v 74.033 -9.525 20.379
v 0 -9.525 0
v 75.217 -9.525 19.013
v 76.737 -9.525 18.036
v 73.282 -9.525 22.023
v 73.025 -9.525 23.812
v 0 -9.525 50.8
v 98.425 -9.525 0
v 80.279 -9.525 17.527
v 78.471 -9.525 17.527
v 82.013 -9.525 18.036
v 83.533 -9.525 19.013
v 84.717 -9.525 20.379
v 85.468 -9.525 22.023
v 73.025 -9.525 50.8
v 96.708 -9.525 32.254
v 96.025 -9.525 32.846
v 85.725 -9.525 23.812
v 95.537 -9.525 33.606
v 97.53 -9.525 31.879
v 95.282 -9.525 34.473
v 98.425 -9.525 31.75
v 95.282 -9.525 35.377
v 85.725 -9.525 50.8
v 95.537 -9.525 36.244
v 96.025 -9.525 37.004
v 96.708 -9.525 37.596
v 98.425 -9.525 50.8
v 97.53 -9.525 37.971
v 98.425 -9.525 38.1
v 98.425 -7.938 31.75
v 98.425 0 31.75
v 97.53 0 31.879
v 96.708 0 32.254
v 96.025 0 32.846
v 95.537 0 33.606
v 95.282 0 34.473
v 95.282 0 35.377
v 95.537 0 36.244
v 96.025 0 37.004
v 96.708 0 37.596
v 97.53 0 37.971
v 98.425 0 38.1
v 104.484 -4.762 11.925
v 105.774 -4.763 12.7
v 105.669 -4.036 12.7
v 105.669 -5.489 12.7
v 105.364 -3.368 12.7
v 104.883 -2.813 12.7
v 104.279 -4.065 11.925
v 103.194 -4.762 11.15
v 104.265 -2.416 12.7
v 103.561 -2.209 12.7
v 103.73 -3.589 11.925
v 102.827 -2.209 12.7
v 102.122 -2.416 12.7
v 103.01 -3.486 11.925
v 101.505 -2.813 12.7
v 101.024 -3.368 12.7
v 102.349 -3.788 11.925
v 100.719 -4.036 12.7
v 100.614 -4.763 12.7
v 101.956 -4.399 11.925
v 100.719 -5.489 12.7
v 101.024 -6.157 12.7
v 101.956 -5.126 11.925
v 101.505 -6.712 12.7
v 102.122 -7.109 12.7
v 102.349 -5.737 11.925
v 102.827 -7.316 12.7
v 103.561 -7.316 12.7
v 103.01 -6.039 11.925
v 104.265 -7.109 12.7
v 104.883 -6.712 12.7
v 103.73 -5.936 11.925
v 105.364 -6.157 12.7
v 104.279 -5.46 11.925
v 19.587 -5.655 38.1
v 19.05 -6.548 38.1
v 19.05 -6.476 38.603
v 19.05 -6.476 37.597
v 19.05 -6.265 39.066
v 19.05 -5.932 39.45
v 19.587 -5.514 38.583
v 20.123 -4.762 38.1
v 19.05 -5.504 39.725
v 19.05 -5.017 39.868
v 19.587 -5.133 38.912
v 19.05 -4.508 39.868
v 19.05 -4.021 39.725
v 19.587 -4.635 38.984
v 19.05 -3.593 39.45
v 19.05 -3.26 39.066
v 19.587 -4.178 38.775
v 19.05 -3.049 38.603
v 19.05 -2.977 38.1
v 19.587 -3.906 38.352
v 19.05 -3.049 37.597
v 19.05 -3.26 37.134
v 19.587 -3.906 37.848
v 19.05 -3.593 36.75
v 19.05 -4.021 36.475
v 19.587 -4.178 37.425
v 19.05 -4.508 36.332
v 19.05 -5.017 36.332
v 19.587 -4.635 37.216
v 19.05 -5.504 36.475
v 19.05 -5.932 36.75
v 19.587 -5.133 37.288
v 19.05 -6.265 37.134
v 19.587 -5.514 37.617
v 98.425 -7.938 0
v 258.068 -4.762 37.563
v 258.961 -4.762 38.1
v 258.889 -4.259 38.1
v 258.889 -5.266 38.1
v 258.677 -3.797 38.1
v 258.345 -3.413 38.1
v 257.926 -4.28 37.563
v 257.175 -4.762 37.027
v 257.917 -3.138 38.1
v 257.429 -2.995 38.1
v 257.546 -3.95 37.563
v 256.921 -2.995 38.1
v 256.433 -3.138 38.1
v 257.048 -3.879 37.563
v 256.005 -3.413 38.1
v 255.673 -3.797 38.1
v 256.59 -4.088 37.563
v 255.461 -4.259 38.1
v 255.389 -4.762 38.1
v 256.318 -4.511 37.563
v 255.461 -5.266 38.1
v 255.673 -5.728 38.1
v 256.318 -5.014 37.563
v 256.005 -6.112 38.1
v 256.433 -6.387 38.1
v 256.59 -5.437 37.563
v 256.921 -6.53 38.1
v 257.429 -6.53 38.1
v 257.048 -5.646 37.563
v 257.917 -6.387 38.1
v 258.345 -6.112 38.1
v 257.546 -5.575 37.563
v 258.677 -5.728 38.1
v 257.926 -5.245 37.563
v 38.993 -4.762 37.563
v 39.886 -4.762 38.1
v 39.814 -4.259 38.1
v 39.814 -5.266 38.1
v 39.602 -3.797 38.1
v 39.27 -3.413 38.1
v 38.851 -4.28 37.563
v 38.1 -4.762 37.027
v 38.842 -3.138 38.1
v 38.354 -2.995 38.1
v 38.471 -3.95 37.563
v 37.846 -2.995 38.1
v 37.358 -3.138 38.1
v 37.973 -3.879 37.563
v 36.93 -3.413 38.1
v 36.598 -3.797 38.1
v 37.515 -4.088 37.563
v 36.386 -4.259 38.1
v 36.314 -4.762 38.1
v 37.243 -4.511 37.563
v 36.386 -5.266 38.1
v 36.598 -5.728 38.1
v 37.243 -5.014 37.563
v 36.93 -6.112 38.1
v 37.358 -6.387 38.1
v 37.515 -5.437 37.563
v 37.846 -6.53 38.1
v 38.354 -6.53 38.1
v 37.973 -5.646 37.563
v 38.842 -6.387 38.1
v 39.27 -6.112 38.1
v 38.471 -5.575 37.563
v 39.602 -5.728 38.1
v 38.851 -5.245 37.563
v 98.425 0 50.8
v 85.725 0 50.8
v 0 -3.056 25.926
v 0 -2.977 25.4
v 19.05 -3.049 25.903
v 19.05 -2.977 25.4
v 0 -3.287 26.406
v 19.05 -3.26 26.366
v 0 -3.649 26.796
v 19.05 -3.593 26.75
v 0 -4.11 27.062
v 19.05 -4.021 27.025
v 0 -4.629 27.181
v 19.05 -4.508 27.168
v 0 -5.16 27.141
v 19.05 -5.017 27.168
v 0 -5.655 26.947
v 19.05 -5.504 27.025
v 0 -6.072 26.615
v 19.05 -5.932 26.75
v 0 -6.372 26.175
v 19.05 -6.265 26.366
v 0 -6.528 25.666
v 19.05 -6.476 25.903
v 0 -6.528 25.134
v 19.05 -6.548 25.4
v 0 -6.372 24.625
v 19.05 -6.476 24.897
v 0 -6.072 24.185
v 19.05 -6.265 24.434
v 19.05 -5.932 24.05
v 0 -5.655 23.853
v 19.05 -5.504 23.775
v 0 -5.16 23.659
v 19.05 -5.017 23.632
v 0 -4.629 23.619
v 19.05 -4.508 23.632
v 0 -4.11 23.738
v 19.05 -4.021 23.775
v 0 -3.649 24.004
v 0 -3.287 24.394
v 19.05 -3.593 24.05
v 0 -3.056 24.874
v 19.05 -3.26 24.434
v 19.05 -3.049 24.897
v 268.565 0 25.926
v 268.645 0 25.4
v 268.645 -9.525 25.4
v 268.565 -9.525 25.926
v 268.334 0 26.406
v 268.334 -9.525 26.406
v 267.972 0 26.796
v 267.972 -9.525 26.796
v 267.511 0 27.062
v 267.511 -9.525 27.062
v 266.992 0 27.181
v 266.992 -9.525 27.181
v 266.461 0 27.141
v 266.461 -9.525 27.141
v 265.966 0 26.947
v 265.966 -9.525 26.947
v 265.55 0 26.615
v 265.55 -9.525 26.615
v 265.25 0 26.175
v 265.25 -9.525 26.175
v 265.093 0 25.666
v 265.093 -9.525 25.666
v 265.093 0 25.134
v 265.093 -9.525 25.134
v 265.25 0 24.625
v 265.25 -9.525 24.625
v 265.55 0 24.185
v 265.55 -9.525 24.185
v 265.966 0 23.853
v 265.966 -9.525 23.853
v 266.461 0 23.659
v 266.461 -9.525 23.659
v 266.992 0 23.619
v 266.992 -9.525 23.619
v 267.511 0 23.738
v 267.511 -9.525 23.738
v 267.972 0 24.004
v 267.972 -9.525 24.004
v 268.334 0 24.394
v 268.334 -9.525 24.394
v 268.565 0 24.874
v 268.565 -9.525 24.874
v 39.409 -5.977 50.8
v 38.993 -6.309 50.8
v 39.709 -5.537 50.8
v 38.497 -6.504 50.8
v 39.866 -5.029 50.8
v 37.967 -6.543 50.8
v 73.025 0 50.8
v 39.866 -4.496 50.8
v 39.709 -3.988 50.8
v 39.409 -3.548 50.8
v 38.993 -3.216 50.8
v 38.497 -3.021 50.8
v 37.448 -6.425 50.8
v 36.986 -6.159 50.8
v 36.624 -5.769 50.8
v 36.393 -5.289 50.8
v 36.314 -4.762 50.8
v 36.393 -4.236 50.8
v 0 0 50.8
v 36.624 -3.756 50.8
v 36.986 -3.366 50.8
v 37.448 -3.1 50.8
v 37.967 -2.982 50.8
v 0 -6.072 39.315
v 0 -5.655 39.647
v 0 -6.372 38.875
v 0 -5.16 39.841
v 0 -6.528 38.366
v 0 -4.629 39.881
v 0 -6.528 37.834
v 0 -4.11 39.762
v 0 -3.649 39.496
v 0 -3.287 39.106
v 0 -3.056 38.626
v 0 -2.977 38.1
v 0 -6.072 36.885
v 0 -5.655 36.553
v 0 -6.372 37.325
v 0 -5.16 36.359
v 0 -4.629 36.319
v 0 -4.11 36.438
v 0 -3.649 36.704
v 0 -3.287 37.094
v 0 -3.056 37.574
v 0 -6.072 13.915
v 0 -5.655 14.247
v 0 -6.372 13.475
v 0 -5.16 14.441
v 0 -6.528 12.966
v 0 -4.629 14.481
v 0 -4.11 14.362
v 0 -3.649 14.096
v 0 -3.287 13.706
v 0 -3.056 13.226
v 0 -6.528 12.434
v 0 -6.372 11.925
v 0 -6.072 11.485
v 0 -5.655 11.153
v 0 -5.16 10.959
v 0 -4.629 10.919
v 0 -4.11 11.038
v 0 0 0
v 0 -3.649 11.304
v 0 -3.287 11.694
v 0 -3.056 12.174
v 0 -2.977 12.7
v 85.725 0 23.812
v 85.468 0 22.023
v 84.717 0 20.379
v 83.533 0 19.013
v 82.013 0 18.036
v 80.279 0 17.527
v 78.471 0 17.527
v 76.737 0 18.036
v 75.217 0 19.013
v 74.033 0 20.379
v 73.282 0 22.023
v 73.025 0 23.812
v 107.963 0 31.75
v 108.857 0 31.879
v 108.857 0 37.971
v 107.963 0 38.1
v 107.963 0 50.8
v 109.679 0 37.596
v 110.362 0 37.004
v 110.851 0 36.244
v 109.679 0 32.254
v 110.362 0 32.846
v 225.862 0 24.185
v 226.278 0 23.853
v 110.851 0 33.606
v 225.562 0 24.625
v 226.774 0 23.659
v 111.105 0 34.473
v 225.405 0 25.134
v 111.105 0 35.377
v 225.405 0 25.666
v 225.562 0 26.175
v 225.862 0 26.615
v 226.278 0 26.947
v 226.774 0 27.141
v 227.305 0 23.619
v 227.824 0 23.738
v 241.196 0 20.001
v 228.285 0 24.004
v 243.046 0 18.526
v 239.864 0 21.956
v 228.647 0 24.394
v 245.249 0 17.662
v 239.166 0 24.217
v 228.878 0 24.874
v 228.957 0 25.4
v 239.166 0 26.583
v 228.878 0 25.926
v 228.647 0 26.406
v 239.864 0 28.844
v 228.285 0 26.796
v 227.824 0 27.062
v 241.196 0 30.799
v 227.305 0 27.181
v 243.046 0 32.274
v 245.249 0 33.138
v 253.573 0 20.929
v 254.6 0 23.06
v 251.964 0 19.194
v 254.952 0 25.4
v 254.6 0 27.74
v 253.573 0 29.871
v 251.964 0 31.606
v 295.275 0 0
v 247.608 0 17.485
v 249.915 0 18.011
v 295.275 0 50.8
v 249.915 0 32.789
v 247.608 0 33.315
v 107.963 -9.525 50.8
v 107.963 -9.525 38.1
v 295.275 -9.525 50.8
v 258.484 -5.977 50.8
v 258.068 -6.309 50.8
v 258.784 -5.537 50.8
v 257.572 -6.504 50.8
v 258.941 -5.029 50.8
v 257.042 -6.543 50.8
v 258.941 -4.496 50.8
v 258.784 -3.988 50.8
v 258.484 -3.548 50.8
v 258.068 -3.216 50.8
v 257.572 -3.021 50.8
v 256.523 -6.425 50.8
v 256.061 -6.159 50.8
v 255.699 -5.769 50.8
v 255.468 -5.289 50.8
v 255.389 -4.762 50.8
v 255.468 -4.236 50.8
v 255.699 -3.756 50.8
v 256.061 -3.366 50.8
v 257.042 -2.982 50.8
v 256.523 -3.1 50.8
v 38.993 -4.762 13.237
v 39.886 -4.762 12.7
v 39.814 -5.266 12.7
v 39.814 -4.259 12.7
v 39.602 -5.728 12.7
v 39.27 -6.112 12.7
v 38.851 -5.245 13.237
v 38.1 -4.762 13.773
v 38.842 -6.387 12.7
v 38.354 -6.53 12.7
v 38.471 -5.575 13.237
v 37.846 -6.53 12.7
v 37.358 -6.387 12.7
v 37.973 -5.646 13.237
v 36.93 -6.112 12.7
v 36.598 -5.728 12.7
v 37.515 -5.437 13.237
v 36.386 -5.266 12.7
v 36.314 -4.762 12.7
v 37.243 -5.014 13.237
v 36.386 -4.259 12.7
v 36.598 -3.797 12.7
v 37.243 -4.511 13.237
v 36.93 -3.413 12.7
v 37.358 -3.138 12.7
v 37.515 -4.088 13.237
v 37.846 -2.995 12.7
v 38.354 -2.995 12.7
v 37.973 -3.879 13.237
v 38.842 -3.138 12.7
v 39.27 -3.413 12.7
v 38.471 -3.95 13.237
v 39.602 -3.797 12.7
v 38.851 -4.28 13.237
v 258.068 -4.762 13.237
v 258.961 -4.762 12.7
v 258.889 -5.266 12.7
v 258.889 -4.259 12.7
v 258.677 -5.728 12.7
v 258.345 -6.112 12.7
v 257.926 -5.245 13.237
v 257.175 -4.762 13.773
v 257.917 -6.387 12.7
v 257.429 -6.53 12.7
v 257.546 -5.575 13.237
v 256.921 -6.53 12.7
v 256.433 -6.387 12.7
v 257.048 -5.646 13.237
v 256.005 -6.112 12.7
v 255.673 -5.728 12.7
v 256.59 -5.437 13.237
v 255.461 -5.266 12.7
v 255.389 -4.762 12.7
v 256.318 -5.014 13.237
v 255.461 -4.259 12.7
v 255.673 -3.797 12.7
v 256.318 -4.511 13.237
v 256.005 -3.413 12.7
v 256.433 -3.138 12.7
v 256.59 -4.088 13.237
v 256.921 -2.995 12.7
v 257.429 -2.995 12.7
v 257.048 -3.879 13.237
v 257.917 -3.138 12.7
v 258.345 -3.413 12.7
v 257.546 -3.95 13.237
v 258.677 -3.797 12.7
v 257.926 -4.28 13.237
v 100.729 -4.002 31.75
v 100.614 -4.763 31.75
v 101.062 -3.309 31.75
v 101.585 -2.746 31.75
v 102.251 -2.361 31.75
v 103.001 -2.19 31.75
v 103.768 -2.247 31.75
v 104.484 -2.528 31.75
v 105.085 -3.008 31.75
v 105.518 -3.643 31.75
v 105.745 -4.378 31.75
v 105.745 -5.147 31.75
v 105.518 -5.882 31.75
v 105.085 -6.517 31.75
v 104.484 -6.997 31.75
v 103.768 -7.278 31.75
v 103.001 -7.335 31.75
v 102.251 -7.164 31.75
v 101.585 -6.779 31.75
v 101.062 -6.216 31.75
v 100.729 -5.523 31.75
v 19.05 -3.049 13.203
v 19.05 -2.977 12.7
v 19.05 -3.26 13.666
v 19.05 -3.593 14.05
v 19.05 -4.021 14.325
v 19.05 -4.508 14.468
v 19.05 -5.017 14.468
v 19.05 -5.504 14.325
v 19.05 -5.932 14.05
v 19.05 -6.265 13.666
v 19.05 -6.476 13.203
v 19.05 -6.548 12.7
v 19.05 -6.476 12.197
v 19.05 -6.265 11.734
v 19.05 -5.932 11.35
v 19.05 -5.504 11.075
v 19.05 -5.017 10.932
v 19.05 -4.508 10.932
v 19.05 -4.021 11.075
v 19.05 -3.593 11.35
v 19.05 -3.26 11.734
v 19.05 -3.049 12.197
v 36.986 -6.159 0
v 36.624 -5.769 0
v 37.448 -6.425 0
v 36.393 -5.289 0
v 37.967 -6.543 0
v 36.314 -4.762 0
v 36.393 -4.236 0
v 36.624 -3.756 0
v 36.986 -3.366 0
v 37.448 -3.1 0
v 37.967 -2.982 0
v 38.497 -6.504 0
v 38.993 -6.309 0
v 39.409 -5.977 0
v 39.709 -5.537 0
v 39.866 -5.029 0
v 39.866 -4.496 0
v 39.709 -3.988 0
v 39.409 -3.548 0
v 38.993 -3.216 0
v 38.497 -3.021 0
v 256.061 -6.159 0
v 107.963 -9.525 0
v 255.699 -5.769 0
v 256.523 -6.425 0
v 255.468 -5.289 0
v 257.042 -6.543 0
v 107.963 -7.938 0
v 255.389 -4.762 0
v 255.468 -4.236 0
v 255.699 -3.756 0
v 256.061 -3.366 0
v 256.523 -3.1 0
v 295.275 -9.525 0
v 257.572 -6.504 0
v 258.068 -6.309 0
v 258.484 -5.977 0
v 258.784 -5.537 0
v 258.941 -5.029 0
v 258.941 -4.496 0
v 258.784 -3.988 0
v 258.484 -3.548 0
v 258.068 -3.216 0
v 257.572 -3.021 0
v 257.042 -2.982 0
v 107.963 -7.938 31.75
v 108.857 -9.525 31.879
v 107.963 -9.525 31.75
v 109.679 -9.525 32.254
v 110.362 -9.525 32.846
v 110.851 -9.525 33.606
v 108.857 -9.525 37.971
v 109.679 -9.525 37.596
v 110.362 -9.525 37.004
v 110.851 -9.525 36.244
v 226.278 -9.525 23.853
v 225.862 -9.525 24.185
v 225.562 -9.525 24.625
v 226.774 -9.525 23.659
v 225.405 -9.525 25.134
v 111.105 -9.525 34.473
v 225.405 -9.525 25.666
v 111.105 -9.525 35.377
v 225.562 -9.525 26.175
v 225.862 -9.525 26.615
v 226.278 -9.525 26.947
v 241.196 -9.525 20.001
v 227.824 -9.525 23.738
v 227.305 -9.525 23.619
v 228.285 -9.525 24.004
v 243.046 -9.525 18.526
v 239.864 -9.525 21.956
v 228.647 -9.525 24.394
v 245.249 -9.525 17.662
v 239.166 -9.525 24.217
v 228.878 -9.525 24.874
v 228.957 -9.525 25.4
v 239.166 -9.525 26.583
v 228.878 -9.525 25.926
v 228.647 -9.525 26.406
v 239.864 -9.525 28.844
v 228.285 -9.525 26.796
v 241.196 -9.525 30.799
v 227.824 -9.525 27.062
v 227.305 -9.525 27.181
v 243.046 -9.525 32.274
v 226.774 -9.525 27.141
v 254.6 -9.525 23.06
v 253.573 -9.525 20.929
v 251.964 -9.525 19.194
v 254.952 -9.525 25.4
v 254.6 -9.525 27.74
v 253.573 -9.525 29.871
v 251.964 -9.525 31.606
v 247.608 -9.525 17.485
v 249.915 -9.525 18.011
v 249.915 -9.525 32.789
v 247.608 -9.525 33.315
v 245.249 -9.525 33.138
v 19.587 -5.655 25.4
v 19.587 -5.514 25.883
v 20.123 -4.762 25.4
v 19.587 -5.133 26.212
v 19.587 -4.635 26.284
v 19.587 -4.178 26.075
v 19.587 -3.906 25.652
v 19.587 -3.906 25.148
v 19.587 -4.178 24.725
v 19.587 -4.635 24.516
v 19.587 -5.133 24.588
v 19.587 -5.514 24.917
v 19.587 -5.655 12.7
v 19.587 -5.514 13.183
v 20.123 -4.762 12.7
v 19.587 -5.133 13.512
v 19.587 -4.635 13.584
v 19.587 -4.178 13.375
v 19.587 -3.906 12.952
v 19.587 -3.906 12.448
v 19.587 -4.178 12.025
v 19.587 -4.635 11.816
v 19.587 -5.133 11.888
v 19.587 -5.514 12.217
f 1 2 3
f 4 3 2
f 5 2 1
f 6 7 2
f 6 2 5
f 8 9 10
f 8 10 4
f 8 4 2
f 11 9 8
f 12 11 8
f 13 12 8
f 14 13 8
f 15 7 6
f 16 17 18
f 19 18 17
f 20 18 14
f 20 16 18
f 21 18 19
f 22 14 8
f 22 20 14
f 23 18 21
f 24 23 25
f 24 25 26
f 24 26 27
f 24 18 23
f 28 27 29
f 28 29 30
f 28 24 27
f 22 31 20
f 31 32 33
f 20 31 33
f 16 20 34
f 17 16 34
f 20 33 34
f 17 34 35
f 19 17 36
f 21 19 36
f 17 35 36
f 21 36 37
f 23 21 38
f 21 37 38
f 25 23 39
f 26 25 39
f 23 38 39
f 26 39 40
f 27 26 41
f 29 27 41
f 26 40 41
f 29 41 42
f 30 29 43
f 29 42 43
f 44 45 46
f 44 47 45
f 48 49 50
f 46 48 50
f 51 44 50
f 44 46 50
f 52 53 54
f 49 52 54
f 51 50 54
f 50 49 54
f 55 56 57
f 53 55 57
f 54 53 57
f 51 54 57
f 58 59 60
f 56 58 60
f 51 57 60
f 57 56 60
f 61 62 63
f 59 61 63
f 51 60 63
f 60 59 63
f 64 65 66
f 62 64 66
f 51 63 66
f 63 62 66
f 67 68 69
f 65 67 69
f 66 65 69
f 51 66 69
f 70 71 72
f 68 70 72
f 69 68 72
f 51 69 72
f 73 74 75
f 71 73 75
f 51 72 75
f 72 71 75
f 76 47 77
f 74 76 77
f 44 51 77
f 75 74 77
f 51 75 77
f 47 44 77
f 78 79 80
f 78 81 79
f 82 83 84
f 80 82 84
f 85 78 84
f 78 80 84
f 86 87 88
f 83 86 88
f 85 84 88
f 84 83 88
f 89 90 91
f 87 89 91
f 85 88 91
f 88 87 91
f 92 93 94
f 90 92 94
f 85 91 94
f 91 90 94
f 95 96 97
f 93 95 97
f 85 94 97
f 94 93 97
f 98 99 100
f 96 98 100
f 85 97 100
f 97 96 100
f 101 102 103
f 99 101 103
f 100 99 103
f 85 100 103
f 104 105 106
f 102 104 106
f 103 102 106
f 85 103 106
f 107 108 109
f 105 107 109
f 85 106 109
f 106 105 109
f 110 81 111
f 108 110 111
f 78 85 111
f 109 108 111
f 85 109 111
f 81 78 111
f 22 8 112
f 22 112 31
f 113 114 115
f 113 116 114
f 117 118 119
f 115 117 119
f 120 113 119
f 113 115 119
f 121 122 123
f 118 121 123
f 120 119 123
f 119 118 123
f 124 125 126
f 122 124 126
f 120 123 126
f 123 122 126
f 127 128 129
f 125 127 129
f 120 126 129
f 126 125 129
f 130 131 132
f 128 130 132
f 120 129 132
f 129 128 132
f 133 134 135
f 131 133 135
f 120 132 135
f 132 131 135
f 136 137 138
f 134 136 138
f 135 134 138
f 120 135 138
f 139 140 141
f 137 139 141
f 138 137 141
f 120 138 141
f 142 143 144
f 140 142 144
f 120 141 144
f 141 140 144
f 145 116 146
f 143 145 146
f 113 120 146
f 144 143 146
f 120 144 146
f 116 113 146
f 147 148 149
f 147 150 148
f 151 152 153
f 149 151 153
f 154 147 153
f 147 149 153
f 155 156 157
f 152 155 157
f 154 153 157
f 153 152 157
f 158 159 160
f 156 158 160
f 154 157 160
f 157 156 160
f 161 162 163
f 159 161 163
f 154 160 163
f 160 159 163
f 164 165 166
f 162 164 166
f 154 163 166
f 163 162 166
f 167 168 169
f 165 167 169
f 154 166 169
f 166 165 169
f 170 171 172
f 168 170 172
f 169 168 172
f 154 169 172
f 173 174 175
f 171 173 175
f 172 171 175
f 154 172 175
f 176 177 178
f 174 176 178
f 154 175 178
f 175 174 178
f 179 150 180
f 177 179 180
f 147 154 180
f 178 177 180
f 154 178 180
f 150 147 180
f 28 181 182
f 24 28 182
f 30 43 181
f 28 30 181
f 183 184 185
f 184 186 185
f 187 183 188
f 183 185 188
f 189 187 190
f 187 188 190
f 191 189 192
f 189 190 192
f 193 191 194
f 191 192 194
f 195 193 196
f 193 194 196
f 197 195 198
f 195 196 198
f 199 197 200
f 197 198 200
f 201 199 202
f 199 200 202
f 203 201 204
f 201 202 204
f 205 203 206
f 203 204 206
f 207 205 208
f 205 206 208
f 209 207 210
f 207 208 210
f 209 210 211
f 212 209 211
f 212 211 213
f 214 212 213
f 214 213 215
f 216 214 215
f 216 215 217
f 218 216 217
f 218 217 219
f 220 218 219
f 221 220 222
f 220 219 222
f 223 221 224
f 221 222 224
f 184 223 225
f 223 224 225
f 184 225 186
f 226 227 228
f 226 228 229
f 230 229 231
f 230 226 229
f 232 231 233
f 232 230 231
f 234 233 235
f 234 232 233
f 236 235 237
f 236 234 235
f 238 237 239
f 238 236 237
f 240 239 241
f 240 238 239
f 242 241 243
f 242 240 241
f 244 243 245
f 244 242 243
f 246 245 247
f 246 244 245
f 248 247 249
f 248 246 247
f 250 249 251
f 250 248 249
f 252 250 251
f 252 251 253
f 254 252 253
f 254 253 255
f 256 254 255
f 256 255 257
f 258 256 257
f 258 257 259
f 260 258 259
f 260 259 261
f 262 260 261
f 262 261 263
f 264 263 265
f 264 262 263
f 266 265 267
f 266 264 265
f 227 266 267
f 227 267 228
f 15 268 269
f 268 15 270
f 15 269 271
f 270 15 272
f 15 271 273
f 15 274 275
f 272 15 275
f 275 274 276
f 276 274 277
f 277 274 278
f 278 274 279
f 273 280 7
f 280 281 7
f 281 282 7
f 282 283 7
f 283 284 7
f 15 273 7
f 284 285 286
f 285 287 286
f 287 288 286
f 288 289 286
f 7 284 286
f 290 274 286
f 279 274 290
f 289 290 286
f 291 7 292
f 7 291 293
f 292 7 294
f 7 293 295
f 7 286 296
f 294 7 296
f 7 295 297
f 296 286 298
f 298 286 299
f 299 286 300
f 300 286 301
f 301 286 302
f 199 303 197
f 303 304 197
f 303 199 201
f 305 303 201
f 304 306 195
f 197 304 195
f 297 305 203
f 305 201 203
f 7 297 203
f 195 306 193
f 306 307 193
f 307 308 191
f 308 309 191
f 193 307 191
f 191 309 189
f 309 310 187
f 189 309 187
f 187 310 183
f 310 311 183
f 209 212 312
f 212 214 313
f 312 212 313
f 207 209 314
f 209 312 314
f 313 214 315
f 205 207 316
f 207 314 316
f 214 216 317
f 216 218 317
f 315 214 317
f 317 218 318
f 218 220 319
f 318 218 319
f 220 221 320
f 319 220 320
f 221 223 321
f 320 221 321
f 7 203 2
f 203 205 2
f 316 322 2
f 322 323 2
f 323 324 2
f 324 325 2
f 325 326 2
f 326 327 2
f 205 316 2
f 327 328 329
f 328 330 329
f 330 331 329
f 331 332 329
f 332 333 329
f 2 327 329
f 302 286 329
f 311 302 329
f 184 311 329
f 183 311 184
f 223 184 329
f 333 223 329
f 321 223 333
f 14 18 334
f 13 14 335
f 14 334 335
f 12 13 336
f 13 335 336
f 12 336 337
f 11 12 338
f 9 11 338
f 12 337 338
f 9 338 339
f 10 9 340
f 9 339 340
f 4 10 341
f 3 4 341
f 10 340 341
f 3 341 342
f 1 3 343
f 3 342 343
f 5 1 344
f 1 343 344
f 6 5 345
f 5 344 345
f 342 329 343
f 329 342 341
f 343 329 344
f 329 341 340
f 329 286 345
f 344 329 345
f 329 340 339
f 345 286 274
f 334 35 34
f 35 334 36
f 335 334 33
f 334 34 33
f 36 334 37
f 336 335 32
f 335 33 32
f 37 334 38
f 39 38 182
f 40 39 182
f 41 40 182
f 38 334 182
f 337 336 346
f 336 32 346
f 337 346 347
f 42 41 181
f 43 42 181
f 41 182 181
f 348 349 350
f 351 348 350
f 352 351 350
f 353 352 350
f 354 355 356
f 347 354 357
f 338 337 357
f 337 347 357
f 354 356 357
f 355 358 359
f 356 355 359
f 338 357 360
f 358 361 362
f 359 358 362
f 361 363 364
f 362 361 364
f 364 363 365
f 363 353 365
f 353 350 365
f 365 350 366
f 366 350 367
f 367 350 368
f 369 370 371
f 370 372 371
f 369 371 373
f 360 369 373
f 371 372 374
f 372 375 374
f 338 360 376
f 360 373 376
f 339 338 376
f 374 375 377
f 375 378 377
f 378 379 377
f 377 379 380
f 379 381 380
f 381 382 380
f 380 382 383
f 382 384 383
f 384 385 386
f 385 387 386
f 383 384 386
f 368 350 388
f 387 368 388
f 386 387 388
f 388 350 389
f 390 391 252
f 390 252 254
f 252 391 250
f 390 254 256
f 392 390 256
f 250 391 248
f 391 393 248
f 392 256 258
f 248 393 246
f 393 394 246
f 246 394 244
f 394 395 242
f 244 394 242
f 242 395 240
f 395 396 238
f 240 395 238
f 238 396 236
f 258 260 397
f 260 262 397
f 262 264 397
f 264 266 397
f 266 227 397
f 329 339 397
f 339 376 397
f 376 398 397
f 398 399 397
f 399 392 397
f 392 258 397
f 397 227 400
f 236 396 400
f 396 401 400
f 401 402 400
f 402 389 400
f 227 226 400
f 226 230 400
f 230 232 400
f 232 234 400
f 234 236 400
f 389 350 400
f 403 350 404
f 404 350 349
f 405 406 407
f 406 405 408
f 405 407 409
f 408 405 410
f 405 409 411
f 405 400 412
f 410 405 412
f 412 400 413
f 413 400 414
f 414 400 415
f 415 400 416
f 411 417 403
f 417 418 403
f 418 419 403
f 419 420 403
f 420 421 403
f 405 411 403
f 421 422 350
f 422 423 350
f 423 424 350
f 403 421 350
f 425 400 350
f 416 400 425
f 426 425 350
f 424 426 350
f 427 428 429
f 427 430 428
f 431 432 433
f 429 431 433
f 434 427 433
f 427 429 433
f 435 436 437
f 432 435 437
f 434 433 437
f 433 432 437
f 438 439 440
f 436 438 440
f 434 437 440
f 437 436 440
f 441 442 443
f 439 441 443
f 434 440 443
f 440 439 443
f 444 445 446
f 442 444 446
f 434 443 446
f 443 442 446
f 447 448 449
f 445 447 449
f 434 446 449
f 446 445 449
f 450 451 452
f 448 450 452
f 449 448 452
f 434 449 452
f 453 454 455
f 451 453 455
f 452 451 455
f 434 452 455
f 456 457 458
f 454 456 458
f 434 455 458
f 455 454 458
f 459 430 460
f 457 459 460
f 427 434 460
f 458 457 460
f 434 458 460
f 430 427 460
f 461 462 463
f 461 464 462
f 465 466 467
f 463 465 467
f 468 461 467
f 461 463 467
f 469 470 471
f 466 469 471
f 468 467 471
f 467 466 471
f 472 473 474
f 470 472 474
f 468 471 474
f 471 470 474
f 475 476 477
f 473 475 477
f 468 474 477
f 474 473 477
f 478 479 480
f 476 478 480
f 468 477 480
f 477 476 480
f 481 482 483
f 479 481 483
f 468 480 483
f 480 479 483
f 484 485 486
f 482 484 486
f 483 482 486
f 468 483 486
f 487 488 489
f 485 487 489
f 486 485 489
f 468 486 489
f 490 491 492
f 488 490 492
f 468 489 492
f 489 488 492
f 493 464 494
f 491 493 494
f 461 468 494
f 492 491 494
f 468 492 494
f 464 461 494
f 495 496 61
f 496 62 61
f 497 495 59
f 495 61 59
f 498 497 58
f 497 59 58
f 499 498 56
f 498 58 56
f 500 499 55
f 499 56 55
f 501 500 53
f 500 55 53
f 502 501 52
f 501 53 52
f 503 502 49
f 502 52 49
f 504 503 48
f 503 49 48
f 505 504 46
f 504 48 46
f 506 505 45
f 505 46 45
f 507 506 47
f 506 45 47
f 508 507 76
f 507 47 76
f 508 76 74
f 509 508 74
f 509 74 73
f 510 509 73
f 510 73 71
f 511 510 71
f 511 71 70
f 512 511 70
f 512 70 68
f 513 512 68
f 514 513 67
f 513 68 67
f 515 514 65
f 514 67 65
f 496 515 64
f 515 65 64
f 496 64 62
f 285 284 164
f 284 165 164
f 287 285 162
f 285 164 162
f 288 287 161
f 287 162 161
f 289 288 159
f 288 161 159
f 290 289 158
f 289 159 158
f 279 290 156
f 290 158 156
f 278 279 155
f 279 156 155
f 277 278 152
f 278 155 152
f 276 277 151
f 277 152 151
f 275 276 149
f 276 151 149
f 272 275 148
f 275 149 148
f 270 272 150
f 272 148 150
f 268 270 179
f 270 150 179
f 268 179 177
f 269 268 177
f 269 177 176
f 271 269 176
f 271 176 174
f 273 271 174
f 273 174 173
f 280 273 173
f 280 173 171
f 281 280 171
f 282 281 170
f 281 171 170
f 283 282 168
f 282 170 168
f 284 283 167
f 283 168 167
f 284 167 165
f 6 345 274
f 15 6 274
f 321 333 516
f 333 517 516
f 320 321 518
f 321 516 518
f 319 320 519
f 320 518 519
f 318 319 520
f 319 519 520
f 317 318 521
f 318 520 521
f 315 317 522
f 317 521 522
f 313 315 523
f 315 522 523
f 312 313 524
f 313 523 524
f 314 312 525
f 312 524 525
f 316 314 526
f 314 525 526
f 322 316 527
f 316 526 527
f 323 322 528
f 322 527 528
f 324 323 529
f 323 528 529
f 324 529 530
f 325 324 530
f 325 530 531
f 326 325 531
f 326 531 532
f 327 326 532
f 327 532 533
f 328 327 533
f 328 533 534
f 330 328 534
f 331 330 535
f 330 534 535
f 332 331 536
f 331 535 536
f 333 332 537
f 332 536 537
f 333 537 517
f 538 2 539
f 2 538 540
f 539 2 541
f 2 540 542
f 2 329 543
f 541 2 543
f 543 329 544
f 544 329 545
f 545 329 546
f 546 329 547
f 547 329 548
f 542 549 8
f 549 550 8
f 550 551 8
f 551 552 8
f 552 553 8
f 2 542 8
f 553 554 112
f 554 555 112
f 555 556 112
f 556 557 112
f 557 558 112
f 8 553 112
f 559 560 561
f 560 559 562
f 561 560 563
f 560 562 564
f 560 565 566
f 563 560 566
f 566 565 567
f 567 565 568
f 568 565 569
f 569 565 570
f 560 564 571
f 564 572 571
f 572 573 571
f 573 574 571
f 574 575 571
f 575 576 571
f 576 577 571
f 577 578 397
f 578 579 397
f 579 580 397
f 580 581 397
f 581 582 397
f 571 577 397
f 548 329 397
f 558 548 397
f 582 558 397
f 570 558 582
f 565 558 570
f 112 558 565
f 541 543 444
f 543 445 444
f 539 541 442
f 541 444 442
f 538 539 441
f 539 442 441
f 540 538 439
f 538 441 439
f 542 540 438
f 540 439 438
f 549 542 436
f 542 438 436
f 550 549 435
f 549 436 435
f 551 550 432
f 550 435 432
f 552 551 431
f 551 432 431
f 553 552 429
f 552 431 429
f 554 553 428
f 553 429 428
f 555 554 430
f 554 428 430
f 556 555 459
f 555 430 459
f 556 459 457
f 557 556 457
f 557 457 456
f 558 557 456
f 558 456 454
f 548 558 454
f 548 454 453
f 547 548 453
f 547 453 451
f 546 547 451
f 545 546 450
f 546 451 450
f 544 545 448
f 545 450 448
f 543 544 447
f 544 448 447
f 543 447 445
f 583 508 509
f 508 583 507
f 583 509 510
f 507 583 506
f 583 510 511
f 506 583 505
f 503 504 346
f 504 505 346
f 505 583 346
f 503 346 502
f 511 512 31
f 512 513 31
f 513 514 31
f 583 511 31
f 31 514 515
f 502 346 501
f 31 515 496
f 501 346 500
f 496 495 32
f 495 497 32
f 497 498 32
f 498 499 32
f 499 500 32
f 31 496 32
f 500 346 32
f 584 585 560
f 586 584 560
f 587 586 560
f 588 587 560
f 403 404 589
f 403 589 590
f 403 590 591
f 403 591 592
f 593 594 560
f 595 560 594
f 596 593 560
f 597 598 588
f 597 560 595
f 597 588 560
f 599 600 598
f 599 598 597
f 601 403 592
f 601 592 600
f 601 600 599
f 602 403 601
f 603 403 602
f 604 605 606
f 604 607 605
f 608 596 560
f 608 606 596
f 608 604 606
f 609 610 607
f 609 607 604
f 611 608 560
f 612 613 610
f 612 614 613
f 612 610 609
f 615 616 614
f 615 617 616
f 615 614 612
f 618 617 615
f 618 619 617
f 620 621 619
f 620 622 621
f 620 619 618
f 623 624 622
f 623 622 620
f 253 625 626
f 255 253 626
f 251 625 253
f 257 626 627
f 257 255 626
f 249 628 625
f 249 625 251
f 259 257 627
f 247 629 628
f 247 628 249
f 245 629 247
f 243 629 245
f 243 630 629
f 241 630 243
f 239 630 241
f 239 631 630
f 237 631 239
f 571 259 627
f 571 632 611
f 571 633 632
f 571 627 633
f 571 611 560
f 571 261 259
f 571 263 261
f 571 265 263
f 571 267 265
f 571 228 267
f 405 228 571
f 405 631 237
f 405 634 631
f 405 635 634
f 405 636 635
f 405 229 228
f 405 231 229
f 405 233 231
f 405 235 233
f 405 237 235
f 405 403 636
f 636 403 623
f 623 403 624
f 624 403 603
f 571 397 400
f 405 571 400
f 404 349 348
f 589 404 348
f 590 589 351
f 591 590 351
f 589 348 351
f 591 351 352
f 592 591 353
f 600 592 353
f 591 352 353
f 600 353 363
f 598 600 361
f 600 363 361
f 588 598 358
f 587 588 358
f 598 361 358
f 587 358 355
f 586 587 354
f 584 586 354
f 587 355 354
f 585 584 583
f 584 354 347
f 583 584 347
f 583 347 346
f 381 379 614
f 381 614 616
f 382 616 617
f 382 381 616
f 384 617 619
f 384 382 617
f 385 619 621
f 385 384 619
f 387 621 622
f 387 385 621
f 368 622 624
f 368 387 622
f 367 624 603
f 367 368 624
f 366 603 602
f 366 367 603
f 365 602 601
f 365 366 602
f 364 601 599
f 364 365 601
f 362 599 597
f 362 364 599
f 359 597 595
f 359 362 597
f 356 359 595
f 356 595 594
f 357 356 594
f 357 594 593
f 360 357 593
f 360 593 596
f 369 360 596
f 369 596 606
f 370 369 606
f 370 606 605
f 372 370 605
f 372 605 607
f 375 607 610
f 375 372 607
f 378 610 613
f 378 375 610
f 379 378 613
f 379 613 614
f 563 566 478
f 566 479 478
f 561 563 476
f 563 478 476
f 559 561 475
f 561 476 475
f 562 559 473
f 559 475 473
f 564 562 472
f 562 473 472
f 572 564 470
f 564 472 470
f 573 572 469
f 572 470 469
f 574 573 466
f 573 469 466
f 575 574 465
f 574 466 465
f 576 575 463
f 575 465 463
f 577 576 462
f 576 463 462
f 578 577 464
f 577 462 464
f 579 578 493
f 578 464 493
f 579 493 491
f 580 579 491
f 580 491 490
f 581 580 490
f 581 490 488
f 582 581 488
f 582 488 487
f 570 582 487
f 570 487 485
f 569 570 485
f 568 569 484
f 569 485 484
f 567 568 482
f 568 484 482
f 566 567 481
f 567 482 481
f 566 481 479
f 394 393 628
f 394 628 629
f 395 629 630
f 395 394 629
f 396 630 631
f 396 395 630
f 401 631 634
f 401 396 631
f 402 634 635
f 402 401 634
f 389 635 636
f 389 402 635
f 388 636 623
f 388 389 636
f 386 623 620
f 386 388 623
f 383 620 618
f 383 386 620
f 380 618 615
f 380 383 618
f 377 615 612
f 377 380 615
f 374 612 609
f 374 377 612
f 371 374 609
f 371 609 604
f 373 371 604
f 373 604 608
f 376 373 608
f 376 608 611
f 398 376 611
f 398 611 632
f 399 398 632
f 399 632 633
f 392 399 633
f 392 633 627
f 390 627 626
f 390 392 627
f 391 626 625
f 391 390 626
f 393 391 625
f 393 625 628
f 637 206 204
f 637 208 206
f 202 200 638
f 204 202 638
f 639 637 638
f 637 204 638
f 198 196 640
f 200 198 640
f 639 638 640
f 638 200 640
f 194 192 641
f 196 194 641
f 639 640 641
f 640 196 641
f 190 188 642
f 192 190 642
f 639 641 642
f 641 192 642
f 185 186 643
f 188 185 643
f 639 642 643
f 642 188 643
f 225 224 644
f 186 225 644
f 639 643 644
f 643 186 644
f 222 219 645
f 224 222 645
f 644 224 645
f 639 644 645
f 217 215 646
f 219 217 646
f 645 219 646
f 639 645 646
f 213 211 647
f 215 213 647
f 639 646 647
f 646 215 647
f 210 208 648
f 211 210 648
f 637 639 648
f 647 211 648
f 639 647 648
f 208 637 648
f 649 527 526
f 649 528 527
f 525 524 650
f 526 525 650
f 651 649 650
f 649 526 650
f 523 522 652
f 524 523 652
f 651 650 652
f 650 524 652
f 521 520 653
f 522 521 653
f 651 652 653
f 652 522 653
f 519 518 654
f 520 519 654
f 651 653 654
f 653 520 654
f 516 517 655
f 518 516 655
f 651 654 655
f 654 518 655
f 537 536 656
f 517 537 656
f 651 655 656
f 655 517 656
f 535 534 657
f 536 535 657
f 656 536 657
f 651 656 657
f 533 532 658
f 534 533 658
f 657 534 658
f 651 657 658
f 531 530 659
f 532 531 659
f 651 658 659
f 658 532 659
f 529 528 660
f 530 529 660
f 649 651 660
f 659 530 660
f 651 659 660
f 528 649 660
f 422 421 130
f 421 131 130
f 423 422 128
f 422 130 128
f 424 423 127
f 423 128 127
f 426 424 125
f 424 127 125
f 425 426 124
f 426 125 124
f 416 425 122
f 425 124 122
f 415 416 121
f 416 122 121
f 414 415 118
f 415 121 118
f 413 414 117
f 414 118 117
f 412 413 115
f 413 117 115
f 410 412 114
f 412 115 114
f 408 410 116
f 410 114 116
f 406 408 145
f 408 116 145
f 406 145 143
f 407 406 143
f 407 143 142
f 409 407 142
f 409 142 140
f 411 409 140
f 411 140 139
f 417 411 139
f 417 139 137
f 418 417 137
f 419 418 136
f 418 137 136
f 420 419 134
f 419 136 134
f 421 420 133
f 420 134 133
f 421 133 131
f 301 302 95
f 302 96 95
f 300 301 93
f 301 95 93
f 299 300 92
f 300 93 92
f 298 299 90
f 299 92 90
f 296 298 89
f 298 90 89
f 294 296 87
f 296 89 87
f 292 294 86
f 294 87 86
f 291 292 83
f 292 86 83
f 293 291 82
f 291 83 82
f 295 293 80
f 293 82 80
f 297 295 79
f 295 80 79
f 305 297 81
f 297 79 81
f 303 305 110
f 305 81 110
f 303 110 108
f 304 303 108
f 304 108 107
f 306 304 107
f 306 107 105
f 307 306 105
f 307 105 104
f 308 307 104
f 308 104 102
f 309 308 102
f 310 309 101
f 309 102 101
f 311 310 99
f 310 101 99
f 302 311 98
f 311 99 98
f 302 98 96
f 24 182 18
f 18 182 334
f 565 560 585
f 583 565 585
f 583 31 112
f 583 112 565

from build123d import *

# Parameters (mm, degrees)
F0_R            = 1.7859375
F0_R_2          = 7.9375
F1_DEPTH        = 9.525
F2_W            = 9.5377
F2_H            = 31.75
F3_DEPTH        = 1.5875
F5_D            = 3.571875
F5_DEPTH        = 19.05
F5_TIP          = 1.0730995118
F7_D            = 5.159375
F7_DEPTH        = 19.05
F7_TIP          = 1.5500326281
F11_D           = 3.571875
F11_DEPTH       = 12.7
F11_TIP         = 1.0730995118
F11_ON_F8_D     = 3.571875
F11_ON_F8_DEPTH = 12.7
F11_ON_F8_TIP   = 1.0730995118
F11_ON_F9_D     = 3.571875
F11_ON_F9_DEPTH = 12.7
F11_ON_F9_TIP   = 1.0730995118


with BuildPart() as f1:
    # F0 (on Front) → F1 (new body)
    with BuildSketch(Plane.XZ):
        with BuildLine():
            Line((0, 50.8), (0, 0))
            Line((0, 0), (295.275, 0))
            Line((295.275, 0), (295.275, 50.8))
            Line((295.275, 50.8), (107.9627, 50.8))
            Line((107.9627, 50.8), (107.9627, 38.1))
            ThreePointArc((107.9627, 38.1), (111.1377, 34.925), (107.9627, 31.75))
            Line((107.9627, 31.75), (98.425, 31.75))
            ThreePointArc((98.425, 31.75), (95.25, 34.925), (98.425, 38.1))
            Line((98.425, 38.1), (98.425, 50.8))
            Line((98.425, 50.8), (85.725, 50.8))
            Line((85.725, 50.8), (85.725, 23.8125))
            ThreePointArc((85.725, 23.8125), (79.375, 17.4625), (73.025, 23.8125))
            Line((73.025, 23.8125), (73.025, 50.8))
            Line((73.025, 50.8), (0, 50.8))
        make_face()
        with Locations((227.17125, 25.4)):
            Circle(F0_R, mode=Mode.SUBTRACT)
        with Locations((247.015, 25.4)):
            Circle(F0_R_2, mode=Mode.SUBTRACT)
        with Locations((266.85875, 25.4)):
            Circle(F0_R, mode=Mode.SUBTRACT)
    extrude(amount=F1_DEPTH)

    # F2 (on face) → F3 (cut)
    with BuildSketch(Plane.XZ.offset(9.525)):
        with Locations((103.19385, 15.875)):
            Rectangle(F2_W, F2_H)
    extrude(amount=-F3_DEPTH, mode=Mode.SUBTRACT)

    # F5
    with Locations(Plane(origin=(0, 0, 0), x_dir=(0, -1, 0), z_dir=(-1, 0, 0))):
        with Locations((4.7625, 38.1), (4.7625, 25.4), (4.7625, 12.7)):
            Hole(F5_D / 2, depth=F5_DEPTH)
            with Locations((0, 0, -(F5_DEPTH + F5_TIP / 2))):  # 118° drill point
                Cone(0, F5_D / 2, F5_TIP, mode=Mode.SUBTRACT)

    # F7
    with Locations(Plane.XY.offset(31.75)):
        with Locations((103.19385, -4.7625)):
            Hole(F7_D / 2, depth=F7_DEPTH)
            with Locations((0, 0, -(F7_DEPTH + F7_TIP / 2))):  # 118° drill point
                Cone(0, F7_D / 2, F7_TIP, mode=Mode.SUBTRACT)

    # F11
    with Locations(Plane(origin=(0, 0, 0), x_dir=(1, 0, 0), z_dir=(0, 0, -1))):
        with Locations((38.1, 4.7625), (257.175, 4.7625)):
            Hole(F11_D / 2, depth=F11_DEPTH)
            with Locations((0, 0, -(F11_DEPTH + F11_TIP / 2))):  # 118° drill point
                Cone(0, F11_D / 2, F11_TIP, mode=Mode.SUBTRACT)

    # F11 on F8
    with Locations(Plane.XY.offset(50.8)):
        with Locations((38.1, -4.7625)):
            Hole(F11_ON_F8_D / 2, depth=F11_ON_F8_DEPTH)
            with Locations((0, 0, -(F11_ON_F8_DEPTH + F11_ON_F8_TIP / 2))):  # 118° drill point
                Cone(0, F11_ON_F8_D / 2, F11_ON_F8_TIP, mode=Mode.SUBTRACT)

    # F11 on F9
    with Locations(Plane.XY.offset(50.8)):
        with Locations((257.175, -4.7625)):
            Hole(F11_ON_F9_D / 2, depth=F11_ON_F9_DEPTH)
            with Locations((0, 0, -(F11_ON_F9_DEPTH + F11_ON_F9_TIP / 2))):  # 118° drill point
                Cone(0, F11_ON_F9_D / 2, F11_ON_F9_TIP, mode=Mode.SUBTRACT)


solid = f1.part
